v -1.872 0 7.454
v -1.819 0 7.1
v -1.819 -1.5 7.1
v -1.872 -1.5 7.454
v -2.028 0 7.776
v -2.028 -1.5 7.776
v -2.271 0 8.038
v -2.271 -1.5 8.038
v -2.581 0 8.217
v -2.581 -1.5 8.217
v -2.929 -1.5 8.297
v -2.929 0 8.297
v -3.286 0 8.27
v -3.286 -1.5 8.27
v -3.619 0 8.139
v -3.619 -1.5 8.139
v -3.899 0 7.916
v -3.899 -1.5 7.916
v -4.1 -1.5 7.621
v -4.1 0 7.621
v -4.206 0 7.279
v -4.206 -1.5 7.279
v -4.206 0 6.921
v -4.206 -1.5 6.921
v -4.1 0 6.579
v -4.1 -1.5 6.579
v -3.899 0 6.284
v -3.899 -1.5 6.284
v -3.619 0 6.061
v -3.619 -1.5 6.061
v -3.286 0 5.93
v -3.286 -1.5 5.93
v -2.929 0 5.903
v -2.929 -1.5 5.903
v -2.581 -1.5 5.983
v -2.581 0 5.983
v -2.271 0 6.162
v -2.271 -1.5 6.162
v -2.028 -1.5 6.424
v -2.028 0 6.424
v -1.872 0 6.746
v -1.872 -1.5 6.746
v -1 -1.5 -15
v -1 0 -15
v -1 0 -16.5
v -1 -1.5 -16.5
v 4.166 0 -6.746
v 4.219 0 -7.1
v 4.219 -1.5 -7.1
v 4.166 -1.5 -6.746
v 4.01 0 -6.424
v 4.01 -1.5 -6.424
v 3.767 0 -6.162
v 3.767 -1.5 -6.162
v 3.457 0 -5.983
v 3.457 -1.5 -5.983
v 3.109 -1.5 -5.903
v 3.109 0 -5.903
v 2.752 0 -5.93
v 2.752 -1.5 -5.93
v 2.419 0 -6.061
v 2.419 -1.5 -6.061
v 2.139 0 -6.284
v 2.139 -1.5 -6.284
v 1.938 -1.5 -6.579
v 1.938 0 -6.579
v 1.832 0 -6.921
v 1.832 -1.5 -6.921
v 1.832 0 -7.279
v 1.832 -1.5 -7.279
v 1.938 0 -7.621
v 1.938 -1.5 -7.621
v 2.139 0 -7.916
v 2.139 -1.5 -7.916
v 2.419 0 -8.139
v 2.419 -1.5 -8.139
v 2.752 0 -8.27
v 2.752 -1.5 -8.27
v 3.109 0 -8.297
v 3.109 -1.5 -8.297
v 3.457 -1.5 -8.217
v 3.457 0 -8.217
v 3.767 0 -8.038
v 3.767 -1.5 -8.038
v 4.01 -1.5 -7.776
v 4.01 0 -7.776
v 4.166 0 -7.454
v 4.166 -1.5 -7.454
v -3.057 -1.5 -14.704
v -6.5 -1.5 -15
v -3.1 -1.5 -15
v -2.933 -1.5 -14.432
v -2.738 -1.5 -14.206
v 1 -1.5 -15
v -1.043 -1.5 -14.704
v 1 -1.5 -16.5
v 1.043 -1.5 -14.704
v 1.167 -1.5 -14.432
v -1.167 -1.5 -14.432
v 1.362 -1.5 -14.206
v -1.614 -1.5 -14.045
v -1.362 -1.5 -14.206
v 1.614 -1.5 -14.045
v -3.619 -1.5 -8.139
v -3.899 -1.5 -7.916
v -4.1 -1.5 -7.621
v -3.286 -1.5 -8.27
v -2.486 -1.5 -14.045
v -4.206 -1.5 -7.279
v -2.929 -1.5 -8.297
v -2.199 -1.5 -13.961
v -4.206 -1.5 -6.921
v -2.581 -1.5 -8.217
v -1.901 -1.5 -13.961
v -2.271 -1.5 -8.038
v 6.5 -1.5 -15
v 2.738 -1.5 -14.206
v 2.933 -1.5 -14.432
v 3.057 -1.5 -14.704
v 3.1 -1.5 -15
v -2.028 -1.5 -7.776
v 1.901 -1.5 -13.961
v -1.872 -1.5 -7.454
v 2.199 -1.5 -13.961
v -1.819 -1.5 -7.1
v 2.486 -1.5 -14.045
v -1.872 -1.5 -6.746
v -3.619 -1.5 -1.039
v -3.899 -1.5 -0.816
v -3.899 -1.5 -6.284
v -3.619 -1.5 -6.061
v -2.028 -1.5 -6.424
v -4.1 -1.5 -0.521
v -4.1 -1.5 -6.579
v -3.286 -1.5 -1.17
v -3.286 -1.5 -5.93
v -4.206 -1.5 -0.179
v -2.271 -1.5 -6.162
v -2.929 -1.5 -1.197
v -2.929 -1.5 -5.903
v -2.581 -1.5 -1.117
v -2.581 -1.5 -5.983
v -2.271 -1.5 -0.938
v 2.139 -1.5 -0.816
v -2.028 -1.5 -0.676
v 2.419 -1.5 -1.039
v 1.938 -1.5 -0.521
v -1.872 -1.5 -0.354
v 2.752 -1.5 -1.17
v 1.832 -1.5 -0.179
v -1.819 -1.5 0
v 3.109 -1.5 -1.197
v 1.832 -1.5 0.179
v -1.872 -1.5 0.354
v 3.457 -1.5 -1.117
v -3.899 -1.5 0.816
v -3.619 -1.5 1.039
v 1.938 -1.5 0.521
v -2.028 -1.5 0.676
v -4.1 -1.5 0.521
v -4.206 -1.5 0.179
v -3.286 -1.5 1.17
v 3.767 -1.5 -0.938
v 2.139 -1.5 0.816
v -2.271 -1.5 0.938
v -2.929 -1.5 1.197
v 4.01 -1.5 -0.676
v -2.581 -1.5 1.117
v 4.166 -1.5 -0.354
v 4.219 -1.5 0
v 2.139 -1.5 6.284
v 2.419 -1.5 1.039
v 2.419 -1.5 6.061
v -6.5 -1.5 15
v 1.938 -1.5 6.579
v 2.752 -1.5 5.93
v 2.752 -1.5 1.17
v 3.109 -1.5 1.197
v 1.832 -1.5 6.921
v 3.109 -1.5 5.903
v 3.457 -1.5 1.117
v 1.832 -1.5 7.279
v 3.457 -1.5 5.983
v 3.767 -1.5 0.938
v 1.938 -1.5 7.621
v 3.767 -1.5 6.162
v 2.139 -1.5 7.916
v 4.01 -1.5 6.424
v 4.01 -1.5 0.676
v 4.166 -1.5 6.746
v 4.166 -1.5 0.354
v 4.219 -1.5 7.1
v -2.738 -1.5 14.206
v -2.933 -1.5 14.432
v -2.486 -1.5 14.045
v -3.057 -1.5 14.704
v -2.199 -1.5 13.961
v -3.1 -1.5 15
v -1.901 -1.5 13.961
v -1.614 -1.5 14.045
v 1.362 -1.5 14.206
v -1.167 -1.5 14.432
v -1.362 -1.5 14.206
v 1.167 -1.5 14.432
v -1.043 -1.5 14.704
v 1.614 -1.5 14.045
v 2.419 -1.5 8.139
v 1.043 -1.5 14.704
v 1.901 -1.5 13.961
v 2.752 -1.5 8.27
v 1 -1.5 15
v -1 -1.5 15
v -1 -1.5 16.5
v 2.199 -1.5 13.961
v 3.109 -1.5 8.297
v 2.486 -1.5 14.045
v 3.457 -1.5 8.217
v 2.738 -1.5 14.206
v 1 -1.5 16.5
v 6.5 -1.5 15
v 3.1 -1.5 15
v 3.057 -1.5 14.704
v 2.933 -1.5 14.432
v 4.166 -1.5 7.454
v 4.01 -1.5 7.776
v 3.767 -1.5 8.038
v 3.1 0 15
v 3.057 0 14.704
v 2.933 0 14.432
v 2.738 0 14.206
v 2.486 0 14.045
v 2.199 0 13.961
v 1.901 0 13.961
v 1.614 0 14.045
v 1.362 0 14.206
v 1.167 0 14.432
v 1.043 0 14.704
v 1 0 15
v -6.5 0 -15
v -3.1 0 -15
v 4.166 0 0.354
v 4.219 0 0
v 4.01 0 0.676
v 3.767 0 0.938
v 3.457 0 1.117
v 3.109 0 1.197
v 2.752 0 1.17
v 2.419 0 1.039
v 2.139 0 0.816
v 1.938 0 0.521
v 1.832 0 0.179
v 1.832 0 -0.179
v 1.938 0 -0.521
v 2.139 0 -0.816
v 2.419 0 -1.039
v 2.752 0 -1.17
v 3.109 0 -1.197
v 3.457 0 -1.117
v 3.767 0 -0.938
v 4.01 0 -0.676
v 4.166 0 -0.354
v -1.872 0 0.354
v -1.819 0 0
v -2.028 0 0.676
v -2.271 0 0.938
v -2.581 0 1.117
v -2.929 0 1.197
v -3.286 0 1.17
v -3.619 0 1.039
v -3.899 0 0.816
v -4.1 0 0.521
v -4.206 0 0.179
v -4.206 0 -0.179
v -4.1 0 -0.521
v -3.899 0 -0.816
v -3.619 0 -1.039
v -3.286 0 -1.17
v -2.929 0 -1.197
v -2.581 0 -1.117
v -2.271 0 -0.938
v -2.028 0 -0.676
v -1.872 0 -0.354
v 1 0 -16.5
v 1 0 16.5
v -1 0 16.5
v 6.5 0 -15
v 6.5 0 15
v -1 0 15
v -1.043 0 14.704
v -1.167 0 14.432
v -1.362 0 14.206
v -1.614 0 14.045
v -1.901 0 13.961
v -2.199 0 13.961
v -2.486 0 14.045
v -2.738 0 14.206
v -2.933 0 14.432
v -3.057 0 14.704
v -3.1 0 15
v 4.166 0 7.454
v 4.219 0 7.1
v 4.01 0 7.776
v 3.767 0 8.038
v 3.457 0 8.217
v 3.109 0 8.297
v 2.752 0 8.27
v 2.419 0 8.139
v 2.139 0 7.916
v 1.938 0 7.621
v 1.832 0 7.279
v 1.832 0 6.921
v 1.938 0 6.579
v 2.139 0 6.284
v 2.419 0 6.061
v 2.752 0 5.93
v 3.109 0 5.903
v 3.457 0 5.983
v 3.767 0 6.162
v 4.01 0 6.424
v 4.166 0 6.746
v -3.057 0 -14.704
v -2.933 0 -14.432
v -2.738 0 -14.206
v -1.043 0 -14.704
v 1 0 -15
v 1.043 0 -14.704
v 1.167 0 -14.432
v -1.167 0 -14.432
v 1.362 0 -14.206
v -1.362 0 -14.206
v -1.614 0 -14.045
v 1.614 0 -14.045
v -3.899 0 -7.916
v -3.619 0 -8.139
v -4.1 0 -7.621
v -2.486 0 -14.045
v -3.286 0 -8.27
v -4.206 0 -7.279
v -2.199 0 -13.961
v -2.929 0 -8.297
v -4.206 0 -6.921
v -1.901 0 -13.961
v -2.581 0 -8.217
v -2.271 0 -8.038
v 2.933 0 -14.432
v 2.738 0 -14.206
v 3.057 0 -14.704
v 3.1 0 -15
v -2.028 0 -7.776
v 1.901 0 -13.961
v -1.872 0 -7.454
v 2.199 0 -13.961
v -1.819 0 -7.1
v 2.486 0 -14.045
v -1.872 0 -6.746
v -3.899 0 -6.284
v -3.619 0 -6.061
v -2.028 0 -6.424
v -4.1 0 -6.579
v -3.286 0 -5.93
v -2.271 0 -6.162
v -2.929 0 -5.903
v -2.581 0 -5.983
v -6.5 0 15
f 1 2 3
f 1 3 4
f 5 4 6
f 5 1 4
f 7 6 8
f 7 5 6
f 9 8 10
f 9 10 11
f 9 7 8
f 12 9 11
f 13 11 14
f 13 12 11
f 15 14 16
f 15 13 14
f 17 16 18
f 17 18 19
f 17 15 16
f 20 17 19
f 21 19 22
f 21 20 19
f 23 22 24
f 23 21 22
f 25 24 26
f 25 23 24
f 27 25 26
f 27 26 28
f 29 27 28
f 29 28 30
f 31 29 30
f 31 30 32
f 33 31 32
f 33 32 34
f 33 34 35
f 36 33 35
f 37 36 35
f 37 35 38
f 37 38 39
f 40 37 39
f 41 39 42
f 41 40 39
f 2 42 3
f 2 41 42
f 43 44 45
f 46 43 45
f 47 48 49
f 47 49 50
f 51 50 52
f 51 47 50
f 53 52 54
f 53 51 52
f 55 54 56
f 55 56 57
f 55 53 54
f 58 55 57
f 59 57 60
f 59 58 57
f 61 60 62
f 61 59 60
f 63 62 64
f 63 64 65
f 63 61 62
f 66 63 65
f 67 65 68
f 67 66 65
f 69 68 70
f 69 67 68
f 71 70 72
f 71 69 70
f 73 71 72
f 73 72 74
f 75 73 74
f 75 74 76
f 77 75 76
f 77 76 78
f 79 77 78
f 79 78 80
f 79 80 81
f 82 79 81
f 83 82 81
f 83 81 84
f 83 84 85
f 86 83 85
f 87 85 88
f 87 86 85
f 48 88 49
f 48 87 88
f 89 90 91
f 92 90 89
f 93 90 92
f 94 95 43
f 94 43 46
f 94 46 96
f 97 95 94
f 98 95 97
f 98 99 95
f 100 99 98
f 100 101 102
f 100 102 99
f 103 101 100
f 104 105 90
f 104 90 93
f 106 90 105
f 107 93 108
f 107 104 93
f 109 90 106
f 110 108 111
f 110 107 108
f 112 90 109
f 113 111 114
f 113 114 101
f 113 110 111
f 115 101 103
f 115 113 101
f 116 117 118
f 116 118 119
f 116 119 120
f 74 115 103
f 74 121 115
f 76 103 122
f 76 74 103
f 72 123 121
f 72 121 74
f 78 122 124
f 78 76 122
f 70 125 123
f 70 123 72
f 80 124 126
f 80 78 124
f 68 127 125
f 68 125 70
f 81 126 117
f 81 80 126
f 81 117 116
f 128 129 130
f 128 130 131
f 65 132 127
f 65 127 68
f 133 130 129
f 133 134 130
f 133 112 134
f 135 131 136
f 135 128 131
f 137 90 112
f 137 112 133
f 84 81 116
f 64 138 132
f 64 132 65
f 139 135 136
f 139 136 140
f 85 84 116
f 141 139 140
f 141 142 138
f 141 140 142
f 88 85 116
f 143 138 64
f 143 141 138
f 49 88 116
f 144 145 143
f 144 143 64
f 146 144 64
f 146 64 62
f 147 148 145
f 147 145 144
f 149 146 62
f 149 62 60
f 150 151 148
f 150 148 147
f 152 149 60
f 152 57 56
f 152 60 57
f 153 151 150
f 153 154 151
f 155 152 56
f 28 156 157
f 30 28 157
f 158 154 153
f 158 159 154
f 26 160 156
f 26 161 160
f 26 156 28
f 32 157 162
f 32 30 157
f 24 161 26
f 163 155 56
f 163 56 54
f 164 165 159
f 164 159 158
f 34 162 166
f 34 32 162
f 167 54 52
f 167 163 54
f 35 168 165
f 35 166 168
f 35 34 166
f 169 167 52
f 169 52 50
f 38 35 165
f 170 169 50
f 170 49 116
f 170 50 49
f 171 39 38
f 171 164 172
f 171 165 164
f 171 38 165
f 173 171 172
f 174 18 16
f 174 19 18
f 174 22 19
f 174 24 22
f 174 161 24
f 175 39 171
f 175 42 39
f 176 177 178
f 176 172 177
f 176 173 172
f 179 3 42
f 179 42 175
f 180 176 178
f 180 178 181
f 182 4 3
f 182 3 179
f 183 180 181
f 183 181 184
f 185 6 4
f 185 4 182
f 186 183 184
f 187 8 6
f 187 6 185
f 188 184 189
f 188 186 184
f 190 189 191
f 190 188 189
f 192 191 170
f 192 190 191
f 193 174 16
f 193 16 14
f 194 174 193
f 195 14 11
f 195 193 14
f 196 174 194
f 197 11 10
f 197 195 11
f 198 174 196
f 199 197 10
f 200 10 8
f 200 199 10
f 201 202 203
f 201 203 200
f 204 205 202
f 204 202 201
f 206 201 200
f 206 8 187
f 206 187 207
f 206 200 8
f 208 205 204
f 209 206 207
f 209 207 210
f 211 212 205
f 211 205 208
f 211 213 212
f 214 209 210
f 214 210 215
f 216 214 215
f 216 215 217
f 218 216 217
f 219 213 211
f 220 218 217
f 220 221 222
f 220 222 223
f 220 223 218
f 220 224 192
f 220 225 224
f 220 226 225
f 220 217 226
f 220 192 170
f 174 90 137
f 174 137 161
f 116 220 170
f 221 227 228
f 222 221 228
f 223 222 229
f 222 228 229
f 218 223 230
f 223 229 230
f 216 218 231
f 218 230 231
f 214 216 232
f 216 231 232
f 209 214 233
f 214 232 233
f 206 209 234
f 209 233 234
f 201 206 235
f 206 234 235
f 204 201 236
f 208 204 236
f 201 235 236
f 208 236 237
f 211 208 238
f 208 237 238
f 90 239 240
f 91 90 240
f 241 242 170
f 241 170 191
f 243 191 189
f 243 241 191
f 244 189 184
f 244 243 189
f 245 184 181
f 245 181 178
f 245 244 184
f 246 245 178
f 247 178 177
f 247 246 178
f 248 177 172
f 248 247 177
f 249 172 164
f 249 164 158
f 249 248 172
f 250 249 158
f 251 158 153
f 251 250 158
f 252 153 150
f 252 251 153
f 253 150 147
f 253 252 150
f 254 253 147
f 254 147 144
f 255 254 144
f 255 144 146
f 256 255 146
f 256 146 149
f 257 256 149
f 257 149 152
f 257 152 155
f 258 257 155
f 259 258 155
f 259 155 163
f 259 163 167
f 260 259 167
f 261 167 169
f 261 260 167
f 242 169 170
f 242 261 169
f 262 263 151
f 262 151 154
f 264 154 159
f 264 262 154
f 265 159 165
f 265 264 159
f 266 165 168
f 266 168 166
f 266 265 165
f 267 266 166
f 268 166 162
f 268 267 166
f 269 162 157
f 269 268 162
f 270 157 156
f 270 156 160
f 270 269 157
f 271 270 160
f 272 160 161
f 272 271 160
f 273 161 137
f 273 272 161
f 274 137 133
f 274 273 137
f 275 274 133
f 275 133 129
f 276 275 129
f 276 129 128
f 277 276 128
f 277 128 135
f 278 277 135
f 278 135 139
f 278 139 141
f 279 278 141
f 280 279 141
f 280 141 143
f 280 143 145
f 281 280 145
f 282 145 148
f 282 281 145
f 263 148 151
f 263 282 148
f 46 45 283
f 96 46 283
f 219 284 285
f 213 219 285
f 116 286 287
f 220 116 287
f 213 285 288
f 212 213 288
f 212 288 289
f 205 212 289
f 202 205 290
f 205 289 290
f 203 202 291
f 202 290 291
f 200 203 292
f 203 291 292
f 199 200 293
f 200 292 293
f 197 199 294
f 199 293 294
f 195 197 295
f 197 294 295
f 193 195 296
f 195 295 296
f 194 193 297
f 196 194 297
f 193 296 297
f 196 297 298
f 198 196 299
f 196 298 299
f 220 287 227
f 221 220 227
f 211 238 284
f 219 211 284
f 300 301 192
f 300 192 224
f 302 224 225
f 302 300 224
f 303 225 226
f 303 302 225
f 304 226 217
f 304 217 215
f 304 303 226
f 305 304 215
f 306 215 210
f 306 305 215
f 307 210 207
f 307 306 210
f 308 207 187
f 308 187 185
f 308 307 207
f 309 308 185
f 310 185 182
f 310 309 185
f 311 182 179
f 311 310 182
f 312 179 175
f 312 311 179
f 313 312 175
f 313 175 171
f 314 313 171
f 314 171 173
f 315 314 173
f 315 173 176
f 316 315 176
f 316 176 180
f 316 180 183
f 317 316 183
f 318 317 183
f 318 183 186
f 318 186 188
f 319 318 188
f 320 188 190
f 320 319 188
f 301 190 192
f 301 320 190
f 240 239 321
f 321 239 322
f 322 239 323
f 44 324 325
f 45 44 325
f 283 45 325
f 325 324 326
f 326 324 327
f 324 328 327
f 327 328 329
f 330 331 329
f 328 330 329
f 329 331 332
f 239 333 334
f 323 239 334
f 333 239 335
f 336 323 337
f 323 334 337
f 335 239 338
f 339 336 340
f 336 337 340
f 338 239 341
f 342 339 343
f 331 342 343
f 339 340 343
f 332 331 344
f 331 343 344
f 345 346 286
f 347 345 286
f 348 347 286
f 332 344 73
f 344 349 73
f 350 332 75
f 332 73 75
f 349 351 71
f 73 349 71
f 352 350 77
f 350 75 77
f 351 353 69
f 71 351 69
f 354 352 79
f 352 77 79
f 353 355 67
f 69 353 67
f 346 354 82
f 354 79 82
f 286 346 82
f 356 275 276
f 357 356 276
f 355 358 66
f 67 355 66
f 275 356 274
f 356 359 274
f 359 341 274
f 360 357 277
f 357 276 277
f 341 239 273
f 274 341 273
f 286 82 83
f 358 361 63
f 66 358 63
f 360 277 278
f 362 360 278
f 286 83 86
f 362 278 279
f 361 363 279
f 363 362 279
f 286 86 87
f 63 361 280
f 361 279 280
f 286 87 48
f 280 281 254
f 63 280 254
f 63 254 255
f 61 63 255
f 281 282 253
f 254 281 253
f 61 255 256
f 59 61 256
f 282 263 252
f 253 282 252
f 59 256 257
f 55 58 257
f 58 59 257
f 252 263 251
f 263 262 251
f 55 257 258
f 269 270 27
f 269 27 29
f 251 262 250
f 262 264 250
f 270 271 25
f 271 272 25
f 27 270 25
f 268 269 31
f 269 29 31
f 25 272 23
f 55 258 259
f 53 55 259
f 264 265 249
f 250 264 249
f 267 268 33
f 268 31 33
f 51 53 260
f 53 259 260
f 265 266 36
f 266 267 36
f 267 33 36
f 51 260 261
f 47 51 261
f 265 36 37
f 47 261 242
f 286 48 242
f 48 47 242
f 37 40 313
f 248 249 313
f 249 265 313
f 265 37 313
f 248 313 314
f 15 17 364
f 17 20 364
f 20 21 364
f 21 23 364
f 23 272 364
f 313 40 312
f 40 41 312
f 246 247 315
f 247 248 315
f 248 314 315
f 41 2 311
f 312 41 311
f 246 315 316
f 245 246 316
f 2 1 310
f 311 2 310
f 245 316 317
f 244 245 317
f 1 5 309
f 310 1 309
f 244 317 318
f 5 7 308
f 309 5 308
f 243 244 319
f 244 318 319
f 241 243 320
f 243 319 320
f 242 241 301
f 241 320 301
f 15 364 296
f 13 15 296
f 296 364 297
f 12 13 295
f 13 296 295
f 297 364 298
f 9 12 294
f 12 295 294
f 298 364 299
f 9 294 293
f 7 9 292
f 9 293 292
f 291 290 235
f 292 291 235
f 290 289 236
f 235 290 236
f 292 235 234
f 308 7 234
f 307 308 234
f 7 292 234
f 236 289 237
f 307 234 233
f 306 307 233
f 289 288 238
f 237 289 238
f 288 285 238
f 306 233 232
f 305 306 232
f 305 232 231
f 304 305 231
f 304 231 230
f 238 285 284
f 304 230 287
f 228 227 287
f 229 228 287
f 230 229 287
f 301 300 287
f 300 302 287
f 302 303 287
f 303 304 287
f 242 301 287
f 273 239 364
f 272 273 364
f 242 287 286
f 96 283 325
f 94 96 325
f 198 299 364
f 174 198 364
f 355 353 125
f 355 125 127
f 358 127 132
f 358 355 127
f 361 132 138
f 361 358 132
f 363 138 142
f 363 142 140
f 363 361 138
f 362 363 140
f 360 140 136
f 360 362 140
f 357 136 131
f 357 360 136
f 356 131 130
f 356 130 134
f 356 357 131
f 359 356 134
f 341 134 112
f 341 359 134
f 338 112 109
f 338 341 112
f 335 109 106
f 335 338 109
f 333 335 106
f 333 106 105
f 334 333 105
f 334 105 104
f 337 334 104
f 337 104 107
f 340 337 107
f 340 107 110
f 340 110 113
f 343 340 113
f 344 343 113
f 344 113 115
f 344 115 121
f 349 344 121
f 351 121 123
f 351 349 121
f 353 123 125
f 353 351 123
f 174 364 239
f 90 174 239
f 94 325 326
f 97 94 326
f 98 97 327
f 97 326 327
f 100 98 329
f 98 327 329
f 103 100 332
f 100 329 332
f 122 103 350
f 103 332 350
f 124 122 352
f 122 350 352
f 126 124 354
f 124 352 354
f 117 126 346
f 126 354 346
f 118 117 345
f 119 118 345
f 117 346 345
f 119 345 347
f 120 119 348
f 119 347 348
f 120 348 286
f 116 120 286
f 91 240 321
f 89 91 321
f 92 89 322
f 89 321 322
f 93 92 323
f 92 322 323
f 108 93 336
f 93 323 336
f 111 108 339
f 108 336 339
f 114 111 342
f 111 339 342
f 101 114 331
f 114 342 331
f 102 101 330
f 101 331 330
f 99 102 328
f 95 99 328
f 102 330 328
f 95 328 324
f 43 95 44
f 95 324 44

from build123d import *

# Parameters (mm, degrees)
F0_R     = 1.2
F1_DEPTH = 1.5


with BuildPart() as f1:
    # F0 (on Front) → F1 (new body)
    with BuildSketch(Plane.XZ):
        with BuildLine():
            ThreePointArc((-1, 15), (-2.05, 13.95), (-3.1, 15))
            Line((-3.1, 15), (-6.5, 15))
            Line((-6.5, 15), (-6.5, 0))
            Line((-6.5, 0), (-6.5, -15))
            Line((-6.5, -15), (-3.1, -15))
            ThreePointArc((-3.1, -15), (-2.05, -13.95), (-1, -15))
            Line((-1, -15), (-1, -16.5))
            Line((-1, -16.5), (1, -16.5))
            Line((1, -16.5), (1, -15))
            ThreePointArc((1, -15), (2.05, -13.95), (3.1, -15))
            Line((3.1, -15), (6.5, -15))
            Line((6.5, -15), (6.5, 0))
            Line((6.5, 0), (6.5, 15))
            Line((6.5, 15), (3.1, 15))
            ThreePointArc((3.1, 15), (2.05, 13.95), (1, 15))
            Line((1, 15), (1, 16.5))
            Line((1, 16.5), (-1, 16.5))
            Line((-1, 16.5), (-1, 15))
        make_face()
        with Locations((-3.019, -7.1)):
            Circle(F0_R, mode=Mode.SUBTRACT)
        with Locations((3.019, -7.1)):
            Circle(F0_R, mode=Mode.SUBTRACT)
        with Locations((-3.019, 0)):
            Circle(F0_R, mode=Mode.SUBTRACT)
        with Locations((-3.019, 7.1)):
            Circle(F0_R, mode=Mode.SUBTRACT)
        with Locations((3.019, 0)):
            Circle(F0_R, mode=Mode.SUBTRACT)
        with Locations((3.019, 7.1)):
            Circle(F0_R, mode=Mode.SUBTRACT)
    extrude(amount=F1_DEPTH)


solid = f1.part
